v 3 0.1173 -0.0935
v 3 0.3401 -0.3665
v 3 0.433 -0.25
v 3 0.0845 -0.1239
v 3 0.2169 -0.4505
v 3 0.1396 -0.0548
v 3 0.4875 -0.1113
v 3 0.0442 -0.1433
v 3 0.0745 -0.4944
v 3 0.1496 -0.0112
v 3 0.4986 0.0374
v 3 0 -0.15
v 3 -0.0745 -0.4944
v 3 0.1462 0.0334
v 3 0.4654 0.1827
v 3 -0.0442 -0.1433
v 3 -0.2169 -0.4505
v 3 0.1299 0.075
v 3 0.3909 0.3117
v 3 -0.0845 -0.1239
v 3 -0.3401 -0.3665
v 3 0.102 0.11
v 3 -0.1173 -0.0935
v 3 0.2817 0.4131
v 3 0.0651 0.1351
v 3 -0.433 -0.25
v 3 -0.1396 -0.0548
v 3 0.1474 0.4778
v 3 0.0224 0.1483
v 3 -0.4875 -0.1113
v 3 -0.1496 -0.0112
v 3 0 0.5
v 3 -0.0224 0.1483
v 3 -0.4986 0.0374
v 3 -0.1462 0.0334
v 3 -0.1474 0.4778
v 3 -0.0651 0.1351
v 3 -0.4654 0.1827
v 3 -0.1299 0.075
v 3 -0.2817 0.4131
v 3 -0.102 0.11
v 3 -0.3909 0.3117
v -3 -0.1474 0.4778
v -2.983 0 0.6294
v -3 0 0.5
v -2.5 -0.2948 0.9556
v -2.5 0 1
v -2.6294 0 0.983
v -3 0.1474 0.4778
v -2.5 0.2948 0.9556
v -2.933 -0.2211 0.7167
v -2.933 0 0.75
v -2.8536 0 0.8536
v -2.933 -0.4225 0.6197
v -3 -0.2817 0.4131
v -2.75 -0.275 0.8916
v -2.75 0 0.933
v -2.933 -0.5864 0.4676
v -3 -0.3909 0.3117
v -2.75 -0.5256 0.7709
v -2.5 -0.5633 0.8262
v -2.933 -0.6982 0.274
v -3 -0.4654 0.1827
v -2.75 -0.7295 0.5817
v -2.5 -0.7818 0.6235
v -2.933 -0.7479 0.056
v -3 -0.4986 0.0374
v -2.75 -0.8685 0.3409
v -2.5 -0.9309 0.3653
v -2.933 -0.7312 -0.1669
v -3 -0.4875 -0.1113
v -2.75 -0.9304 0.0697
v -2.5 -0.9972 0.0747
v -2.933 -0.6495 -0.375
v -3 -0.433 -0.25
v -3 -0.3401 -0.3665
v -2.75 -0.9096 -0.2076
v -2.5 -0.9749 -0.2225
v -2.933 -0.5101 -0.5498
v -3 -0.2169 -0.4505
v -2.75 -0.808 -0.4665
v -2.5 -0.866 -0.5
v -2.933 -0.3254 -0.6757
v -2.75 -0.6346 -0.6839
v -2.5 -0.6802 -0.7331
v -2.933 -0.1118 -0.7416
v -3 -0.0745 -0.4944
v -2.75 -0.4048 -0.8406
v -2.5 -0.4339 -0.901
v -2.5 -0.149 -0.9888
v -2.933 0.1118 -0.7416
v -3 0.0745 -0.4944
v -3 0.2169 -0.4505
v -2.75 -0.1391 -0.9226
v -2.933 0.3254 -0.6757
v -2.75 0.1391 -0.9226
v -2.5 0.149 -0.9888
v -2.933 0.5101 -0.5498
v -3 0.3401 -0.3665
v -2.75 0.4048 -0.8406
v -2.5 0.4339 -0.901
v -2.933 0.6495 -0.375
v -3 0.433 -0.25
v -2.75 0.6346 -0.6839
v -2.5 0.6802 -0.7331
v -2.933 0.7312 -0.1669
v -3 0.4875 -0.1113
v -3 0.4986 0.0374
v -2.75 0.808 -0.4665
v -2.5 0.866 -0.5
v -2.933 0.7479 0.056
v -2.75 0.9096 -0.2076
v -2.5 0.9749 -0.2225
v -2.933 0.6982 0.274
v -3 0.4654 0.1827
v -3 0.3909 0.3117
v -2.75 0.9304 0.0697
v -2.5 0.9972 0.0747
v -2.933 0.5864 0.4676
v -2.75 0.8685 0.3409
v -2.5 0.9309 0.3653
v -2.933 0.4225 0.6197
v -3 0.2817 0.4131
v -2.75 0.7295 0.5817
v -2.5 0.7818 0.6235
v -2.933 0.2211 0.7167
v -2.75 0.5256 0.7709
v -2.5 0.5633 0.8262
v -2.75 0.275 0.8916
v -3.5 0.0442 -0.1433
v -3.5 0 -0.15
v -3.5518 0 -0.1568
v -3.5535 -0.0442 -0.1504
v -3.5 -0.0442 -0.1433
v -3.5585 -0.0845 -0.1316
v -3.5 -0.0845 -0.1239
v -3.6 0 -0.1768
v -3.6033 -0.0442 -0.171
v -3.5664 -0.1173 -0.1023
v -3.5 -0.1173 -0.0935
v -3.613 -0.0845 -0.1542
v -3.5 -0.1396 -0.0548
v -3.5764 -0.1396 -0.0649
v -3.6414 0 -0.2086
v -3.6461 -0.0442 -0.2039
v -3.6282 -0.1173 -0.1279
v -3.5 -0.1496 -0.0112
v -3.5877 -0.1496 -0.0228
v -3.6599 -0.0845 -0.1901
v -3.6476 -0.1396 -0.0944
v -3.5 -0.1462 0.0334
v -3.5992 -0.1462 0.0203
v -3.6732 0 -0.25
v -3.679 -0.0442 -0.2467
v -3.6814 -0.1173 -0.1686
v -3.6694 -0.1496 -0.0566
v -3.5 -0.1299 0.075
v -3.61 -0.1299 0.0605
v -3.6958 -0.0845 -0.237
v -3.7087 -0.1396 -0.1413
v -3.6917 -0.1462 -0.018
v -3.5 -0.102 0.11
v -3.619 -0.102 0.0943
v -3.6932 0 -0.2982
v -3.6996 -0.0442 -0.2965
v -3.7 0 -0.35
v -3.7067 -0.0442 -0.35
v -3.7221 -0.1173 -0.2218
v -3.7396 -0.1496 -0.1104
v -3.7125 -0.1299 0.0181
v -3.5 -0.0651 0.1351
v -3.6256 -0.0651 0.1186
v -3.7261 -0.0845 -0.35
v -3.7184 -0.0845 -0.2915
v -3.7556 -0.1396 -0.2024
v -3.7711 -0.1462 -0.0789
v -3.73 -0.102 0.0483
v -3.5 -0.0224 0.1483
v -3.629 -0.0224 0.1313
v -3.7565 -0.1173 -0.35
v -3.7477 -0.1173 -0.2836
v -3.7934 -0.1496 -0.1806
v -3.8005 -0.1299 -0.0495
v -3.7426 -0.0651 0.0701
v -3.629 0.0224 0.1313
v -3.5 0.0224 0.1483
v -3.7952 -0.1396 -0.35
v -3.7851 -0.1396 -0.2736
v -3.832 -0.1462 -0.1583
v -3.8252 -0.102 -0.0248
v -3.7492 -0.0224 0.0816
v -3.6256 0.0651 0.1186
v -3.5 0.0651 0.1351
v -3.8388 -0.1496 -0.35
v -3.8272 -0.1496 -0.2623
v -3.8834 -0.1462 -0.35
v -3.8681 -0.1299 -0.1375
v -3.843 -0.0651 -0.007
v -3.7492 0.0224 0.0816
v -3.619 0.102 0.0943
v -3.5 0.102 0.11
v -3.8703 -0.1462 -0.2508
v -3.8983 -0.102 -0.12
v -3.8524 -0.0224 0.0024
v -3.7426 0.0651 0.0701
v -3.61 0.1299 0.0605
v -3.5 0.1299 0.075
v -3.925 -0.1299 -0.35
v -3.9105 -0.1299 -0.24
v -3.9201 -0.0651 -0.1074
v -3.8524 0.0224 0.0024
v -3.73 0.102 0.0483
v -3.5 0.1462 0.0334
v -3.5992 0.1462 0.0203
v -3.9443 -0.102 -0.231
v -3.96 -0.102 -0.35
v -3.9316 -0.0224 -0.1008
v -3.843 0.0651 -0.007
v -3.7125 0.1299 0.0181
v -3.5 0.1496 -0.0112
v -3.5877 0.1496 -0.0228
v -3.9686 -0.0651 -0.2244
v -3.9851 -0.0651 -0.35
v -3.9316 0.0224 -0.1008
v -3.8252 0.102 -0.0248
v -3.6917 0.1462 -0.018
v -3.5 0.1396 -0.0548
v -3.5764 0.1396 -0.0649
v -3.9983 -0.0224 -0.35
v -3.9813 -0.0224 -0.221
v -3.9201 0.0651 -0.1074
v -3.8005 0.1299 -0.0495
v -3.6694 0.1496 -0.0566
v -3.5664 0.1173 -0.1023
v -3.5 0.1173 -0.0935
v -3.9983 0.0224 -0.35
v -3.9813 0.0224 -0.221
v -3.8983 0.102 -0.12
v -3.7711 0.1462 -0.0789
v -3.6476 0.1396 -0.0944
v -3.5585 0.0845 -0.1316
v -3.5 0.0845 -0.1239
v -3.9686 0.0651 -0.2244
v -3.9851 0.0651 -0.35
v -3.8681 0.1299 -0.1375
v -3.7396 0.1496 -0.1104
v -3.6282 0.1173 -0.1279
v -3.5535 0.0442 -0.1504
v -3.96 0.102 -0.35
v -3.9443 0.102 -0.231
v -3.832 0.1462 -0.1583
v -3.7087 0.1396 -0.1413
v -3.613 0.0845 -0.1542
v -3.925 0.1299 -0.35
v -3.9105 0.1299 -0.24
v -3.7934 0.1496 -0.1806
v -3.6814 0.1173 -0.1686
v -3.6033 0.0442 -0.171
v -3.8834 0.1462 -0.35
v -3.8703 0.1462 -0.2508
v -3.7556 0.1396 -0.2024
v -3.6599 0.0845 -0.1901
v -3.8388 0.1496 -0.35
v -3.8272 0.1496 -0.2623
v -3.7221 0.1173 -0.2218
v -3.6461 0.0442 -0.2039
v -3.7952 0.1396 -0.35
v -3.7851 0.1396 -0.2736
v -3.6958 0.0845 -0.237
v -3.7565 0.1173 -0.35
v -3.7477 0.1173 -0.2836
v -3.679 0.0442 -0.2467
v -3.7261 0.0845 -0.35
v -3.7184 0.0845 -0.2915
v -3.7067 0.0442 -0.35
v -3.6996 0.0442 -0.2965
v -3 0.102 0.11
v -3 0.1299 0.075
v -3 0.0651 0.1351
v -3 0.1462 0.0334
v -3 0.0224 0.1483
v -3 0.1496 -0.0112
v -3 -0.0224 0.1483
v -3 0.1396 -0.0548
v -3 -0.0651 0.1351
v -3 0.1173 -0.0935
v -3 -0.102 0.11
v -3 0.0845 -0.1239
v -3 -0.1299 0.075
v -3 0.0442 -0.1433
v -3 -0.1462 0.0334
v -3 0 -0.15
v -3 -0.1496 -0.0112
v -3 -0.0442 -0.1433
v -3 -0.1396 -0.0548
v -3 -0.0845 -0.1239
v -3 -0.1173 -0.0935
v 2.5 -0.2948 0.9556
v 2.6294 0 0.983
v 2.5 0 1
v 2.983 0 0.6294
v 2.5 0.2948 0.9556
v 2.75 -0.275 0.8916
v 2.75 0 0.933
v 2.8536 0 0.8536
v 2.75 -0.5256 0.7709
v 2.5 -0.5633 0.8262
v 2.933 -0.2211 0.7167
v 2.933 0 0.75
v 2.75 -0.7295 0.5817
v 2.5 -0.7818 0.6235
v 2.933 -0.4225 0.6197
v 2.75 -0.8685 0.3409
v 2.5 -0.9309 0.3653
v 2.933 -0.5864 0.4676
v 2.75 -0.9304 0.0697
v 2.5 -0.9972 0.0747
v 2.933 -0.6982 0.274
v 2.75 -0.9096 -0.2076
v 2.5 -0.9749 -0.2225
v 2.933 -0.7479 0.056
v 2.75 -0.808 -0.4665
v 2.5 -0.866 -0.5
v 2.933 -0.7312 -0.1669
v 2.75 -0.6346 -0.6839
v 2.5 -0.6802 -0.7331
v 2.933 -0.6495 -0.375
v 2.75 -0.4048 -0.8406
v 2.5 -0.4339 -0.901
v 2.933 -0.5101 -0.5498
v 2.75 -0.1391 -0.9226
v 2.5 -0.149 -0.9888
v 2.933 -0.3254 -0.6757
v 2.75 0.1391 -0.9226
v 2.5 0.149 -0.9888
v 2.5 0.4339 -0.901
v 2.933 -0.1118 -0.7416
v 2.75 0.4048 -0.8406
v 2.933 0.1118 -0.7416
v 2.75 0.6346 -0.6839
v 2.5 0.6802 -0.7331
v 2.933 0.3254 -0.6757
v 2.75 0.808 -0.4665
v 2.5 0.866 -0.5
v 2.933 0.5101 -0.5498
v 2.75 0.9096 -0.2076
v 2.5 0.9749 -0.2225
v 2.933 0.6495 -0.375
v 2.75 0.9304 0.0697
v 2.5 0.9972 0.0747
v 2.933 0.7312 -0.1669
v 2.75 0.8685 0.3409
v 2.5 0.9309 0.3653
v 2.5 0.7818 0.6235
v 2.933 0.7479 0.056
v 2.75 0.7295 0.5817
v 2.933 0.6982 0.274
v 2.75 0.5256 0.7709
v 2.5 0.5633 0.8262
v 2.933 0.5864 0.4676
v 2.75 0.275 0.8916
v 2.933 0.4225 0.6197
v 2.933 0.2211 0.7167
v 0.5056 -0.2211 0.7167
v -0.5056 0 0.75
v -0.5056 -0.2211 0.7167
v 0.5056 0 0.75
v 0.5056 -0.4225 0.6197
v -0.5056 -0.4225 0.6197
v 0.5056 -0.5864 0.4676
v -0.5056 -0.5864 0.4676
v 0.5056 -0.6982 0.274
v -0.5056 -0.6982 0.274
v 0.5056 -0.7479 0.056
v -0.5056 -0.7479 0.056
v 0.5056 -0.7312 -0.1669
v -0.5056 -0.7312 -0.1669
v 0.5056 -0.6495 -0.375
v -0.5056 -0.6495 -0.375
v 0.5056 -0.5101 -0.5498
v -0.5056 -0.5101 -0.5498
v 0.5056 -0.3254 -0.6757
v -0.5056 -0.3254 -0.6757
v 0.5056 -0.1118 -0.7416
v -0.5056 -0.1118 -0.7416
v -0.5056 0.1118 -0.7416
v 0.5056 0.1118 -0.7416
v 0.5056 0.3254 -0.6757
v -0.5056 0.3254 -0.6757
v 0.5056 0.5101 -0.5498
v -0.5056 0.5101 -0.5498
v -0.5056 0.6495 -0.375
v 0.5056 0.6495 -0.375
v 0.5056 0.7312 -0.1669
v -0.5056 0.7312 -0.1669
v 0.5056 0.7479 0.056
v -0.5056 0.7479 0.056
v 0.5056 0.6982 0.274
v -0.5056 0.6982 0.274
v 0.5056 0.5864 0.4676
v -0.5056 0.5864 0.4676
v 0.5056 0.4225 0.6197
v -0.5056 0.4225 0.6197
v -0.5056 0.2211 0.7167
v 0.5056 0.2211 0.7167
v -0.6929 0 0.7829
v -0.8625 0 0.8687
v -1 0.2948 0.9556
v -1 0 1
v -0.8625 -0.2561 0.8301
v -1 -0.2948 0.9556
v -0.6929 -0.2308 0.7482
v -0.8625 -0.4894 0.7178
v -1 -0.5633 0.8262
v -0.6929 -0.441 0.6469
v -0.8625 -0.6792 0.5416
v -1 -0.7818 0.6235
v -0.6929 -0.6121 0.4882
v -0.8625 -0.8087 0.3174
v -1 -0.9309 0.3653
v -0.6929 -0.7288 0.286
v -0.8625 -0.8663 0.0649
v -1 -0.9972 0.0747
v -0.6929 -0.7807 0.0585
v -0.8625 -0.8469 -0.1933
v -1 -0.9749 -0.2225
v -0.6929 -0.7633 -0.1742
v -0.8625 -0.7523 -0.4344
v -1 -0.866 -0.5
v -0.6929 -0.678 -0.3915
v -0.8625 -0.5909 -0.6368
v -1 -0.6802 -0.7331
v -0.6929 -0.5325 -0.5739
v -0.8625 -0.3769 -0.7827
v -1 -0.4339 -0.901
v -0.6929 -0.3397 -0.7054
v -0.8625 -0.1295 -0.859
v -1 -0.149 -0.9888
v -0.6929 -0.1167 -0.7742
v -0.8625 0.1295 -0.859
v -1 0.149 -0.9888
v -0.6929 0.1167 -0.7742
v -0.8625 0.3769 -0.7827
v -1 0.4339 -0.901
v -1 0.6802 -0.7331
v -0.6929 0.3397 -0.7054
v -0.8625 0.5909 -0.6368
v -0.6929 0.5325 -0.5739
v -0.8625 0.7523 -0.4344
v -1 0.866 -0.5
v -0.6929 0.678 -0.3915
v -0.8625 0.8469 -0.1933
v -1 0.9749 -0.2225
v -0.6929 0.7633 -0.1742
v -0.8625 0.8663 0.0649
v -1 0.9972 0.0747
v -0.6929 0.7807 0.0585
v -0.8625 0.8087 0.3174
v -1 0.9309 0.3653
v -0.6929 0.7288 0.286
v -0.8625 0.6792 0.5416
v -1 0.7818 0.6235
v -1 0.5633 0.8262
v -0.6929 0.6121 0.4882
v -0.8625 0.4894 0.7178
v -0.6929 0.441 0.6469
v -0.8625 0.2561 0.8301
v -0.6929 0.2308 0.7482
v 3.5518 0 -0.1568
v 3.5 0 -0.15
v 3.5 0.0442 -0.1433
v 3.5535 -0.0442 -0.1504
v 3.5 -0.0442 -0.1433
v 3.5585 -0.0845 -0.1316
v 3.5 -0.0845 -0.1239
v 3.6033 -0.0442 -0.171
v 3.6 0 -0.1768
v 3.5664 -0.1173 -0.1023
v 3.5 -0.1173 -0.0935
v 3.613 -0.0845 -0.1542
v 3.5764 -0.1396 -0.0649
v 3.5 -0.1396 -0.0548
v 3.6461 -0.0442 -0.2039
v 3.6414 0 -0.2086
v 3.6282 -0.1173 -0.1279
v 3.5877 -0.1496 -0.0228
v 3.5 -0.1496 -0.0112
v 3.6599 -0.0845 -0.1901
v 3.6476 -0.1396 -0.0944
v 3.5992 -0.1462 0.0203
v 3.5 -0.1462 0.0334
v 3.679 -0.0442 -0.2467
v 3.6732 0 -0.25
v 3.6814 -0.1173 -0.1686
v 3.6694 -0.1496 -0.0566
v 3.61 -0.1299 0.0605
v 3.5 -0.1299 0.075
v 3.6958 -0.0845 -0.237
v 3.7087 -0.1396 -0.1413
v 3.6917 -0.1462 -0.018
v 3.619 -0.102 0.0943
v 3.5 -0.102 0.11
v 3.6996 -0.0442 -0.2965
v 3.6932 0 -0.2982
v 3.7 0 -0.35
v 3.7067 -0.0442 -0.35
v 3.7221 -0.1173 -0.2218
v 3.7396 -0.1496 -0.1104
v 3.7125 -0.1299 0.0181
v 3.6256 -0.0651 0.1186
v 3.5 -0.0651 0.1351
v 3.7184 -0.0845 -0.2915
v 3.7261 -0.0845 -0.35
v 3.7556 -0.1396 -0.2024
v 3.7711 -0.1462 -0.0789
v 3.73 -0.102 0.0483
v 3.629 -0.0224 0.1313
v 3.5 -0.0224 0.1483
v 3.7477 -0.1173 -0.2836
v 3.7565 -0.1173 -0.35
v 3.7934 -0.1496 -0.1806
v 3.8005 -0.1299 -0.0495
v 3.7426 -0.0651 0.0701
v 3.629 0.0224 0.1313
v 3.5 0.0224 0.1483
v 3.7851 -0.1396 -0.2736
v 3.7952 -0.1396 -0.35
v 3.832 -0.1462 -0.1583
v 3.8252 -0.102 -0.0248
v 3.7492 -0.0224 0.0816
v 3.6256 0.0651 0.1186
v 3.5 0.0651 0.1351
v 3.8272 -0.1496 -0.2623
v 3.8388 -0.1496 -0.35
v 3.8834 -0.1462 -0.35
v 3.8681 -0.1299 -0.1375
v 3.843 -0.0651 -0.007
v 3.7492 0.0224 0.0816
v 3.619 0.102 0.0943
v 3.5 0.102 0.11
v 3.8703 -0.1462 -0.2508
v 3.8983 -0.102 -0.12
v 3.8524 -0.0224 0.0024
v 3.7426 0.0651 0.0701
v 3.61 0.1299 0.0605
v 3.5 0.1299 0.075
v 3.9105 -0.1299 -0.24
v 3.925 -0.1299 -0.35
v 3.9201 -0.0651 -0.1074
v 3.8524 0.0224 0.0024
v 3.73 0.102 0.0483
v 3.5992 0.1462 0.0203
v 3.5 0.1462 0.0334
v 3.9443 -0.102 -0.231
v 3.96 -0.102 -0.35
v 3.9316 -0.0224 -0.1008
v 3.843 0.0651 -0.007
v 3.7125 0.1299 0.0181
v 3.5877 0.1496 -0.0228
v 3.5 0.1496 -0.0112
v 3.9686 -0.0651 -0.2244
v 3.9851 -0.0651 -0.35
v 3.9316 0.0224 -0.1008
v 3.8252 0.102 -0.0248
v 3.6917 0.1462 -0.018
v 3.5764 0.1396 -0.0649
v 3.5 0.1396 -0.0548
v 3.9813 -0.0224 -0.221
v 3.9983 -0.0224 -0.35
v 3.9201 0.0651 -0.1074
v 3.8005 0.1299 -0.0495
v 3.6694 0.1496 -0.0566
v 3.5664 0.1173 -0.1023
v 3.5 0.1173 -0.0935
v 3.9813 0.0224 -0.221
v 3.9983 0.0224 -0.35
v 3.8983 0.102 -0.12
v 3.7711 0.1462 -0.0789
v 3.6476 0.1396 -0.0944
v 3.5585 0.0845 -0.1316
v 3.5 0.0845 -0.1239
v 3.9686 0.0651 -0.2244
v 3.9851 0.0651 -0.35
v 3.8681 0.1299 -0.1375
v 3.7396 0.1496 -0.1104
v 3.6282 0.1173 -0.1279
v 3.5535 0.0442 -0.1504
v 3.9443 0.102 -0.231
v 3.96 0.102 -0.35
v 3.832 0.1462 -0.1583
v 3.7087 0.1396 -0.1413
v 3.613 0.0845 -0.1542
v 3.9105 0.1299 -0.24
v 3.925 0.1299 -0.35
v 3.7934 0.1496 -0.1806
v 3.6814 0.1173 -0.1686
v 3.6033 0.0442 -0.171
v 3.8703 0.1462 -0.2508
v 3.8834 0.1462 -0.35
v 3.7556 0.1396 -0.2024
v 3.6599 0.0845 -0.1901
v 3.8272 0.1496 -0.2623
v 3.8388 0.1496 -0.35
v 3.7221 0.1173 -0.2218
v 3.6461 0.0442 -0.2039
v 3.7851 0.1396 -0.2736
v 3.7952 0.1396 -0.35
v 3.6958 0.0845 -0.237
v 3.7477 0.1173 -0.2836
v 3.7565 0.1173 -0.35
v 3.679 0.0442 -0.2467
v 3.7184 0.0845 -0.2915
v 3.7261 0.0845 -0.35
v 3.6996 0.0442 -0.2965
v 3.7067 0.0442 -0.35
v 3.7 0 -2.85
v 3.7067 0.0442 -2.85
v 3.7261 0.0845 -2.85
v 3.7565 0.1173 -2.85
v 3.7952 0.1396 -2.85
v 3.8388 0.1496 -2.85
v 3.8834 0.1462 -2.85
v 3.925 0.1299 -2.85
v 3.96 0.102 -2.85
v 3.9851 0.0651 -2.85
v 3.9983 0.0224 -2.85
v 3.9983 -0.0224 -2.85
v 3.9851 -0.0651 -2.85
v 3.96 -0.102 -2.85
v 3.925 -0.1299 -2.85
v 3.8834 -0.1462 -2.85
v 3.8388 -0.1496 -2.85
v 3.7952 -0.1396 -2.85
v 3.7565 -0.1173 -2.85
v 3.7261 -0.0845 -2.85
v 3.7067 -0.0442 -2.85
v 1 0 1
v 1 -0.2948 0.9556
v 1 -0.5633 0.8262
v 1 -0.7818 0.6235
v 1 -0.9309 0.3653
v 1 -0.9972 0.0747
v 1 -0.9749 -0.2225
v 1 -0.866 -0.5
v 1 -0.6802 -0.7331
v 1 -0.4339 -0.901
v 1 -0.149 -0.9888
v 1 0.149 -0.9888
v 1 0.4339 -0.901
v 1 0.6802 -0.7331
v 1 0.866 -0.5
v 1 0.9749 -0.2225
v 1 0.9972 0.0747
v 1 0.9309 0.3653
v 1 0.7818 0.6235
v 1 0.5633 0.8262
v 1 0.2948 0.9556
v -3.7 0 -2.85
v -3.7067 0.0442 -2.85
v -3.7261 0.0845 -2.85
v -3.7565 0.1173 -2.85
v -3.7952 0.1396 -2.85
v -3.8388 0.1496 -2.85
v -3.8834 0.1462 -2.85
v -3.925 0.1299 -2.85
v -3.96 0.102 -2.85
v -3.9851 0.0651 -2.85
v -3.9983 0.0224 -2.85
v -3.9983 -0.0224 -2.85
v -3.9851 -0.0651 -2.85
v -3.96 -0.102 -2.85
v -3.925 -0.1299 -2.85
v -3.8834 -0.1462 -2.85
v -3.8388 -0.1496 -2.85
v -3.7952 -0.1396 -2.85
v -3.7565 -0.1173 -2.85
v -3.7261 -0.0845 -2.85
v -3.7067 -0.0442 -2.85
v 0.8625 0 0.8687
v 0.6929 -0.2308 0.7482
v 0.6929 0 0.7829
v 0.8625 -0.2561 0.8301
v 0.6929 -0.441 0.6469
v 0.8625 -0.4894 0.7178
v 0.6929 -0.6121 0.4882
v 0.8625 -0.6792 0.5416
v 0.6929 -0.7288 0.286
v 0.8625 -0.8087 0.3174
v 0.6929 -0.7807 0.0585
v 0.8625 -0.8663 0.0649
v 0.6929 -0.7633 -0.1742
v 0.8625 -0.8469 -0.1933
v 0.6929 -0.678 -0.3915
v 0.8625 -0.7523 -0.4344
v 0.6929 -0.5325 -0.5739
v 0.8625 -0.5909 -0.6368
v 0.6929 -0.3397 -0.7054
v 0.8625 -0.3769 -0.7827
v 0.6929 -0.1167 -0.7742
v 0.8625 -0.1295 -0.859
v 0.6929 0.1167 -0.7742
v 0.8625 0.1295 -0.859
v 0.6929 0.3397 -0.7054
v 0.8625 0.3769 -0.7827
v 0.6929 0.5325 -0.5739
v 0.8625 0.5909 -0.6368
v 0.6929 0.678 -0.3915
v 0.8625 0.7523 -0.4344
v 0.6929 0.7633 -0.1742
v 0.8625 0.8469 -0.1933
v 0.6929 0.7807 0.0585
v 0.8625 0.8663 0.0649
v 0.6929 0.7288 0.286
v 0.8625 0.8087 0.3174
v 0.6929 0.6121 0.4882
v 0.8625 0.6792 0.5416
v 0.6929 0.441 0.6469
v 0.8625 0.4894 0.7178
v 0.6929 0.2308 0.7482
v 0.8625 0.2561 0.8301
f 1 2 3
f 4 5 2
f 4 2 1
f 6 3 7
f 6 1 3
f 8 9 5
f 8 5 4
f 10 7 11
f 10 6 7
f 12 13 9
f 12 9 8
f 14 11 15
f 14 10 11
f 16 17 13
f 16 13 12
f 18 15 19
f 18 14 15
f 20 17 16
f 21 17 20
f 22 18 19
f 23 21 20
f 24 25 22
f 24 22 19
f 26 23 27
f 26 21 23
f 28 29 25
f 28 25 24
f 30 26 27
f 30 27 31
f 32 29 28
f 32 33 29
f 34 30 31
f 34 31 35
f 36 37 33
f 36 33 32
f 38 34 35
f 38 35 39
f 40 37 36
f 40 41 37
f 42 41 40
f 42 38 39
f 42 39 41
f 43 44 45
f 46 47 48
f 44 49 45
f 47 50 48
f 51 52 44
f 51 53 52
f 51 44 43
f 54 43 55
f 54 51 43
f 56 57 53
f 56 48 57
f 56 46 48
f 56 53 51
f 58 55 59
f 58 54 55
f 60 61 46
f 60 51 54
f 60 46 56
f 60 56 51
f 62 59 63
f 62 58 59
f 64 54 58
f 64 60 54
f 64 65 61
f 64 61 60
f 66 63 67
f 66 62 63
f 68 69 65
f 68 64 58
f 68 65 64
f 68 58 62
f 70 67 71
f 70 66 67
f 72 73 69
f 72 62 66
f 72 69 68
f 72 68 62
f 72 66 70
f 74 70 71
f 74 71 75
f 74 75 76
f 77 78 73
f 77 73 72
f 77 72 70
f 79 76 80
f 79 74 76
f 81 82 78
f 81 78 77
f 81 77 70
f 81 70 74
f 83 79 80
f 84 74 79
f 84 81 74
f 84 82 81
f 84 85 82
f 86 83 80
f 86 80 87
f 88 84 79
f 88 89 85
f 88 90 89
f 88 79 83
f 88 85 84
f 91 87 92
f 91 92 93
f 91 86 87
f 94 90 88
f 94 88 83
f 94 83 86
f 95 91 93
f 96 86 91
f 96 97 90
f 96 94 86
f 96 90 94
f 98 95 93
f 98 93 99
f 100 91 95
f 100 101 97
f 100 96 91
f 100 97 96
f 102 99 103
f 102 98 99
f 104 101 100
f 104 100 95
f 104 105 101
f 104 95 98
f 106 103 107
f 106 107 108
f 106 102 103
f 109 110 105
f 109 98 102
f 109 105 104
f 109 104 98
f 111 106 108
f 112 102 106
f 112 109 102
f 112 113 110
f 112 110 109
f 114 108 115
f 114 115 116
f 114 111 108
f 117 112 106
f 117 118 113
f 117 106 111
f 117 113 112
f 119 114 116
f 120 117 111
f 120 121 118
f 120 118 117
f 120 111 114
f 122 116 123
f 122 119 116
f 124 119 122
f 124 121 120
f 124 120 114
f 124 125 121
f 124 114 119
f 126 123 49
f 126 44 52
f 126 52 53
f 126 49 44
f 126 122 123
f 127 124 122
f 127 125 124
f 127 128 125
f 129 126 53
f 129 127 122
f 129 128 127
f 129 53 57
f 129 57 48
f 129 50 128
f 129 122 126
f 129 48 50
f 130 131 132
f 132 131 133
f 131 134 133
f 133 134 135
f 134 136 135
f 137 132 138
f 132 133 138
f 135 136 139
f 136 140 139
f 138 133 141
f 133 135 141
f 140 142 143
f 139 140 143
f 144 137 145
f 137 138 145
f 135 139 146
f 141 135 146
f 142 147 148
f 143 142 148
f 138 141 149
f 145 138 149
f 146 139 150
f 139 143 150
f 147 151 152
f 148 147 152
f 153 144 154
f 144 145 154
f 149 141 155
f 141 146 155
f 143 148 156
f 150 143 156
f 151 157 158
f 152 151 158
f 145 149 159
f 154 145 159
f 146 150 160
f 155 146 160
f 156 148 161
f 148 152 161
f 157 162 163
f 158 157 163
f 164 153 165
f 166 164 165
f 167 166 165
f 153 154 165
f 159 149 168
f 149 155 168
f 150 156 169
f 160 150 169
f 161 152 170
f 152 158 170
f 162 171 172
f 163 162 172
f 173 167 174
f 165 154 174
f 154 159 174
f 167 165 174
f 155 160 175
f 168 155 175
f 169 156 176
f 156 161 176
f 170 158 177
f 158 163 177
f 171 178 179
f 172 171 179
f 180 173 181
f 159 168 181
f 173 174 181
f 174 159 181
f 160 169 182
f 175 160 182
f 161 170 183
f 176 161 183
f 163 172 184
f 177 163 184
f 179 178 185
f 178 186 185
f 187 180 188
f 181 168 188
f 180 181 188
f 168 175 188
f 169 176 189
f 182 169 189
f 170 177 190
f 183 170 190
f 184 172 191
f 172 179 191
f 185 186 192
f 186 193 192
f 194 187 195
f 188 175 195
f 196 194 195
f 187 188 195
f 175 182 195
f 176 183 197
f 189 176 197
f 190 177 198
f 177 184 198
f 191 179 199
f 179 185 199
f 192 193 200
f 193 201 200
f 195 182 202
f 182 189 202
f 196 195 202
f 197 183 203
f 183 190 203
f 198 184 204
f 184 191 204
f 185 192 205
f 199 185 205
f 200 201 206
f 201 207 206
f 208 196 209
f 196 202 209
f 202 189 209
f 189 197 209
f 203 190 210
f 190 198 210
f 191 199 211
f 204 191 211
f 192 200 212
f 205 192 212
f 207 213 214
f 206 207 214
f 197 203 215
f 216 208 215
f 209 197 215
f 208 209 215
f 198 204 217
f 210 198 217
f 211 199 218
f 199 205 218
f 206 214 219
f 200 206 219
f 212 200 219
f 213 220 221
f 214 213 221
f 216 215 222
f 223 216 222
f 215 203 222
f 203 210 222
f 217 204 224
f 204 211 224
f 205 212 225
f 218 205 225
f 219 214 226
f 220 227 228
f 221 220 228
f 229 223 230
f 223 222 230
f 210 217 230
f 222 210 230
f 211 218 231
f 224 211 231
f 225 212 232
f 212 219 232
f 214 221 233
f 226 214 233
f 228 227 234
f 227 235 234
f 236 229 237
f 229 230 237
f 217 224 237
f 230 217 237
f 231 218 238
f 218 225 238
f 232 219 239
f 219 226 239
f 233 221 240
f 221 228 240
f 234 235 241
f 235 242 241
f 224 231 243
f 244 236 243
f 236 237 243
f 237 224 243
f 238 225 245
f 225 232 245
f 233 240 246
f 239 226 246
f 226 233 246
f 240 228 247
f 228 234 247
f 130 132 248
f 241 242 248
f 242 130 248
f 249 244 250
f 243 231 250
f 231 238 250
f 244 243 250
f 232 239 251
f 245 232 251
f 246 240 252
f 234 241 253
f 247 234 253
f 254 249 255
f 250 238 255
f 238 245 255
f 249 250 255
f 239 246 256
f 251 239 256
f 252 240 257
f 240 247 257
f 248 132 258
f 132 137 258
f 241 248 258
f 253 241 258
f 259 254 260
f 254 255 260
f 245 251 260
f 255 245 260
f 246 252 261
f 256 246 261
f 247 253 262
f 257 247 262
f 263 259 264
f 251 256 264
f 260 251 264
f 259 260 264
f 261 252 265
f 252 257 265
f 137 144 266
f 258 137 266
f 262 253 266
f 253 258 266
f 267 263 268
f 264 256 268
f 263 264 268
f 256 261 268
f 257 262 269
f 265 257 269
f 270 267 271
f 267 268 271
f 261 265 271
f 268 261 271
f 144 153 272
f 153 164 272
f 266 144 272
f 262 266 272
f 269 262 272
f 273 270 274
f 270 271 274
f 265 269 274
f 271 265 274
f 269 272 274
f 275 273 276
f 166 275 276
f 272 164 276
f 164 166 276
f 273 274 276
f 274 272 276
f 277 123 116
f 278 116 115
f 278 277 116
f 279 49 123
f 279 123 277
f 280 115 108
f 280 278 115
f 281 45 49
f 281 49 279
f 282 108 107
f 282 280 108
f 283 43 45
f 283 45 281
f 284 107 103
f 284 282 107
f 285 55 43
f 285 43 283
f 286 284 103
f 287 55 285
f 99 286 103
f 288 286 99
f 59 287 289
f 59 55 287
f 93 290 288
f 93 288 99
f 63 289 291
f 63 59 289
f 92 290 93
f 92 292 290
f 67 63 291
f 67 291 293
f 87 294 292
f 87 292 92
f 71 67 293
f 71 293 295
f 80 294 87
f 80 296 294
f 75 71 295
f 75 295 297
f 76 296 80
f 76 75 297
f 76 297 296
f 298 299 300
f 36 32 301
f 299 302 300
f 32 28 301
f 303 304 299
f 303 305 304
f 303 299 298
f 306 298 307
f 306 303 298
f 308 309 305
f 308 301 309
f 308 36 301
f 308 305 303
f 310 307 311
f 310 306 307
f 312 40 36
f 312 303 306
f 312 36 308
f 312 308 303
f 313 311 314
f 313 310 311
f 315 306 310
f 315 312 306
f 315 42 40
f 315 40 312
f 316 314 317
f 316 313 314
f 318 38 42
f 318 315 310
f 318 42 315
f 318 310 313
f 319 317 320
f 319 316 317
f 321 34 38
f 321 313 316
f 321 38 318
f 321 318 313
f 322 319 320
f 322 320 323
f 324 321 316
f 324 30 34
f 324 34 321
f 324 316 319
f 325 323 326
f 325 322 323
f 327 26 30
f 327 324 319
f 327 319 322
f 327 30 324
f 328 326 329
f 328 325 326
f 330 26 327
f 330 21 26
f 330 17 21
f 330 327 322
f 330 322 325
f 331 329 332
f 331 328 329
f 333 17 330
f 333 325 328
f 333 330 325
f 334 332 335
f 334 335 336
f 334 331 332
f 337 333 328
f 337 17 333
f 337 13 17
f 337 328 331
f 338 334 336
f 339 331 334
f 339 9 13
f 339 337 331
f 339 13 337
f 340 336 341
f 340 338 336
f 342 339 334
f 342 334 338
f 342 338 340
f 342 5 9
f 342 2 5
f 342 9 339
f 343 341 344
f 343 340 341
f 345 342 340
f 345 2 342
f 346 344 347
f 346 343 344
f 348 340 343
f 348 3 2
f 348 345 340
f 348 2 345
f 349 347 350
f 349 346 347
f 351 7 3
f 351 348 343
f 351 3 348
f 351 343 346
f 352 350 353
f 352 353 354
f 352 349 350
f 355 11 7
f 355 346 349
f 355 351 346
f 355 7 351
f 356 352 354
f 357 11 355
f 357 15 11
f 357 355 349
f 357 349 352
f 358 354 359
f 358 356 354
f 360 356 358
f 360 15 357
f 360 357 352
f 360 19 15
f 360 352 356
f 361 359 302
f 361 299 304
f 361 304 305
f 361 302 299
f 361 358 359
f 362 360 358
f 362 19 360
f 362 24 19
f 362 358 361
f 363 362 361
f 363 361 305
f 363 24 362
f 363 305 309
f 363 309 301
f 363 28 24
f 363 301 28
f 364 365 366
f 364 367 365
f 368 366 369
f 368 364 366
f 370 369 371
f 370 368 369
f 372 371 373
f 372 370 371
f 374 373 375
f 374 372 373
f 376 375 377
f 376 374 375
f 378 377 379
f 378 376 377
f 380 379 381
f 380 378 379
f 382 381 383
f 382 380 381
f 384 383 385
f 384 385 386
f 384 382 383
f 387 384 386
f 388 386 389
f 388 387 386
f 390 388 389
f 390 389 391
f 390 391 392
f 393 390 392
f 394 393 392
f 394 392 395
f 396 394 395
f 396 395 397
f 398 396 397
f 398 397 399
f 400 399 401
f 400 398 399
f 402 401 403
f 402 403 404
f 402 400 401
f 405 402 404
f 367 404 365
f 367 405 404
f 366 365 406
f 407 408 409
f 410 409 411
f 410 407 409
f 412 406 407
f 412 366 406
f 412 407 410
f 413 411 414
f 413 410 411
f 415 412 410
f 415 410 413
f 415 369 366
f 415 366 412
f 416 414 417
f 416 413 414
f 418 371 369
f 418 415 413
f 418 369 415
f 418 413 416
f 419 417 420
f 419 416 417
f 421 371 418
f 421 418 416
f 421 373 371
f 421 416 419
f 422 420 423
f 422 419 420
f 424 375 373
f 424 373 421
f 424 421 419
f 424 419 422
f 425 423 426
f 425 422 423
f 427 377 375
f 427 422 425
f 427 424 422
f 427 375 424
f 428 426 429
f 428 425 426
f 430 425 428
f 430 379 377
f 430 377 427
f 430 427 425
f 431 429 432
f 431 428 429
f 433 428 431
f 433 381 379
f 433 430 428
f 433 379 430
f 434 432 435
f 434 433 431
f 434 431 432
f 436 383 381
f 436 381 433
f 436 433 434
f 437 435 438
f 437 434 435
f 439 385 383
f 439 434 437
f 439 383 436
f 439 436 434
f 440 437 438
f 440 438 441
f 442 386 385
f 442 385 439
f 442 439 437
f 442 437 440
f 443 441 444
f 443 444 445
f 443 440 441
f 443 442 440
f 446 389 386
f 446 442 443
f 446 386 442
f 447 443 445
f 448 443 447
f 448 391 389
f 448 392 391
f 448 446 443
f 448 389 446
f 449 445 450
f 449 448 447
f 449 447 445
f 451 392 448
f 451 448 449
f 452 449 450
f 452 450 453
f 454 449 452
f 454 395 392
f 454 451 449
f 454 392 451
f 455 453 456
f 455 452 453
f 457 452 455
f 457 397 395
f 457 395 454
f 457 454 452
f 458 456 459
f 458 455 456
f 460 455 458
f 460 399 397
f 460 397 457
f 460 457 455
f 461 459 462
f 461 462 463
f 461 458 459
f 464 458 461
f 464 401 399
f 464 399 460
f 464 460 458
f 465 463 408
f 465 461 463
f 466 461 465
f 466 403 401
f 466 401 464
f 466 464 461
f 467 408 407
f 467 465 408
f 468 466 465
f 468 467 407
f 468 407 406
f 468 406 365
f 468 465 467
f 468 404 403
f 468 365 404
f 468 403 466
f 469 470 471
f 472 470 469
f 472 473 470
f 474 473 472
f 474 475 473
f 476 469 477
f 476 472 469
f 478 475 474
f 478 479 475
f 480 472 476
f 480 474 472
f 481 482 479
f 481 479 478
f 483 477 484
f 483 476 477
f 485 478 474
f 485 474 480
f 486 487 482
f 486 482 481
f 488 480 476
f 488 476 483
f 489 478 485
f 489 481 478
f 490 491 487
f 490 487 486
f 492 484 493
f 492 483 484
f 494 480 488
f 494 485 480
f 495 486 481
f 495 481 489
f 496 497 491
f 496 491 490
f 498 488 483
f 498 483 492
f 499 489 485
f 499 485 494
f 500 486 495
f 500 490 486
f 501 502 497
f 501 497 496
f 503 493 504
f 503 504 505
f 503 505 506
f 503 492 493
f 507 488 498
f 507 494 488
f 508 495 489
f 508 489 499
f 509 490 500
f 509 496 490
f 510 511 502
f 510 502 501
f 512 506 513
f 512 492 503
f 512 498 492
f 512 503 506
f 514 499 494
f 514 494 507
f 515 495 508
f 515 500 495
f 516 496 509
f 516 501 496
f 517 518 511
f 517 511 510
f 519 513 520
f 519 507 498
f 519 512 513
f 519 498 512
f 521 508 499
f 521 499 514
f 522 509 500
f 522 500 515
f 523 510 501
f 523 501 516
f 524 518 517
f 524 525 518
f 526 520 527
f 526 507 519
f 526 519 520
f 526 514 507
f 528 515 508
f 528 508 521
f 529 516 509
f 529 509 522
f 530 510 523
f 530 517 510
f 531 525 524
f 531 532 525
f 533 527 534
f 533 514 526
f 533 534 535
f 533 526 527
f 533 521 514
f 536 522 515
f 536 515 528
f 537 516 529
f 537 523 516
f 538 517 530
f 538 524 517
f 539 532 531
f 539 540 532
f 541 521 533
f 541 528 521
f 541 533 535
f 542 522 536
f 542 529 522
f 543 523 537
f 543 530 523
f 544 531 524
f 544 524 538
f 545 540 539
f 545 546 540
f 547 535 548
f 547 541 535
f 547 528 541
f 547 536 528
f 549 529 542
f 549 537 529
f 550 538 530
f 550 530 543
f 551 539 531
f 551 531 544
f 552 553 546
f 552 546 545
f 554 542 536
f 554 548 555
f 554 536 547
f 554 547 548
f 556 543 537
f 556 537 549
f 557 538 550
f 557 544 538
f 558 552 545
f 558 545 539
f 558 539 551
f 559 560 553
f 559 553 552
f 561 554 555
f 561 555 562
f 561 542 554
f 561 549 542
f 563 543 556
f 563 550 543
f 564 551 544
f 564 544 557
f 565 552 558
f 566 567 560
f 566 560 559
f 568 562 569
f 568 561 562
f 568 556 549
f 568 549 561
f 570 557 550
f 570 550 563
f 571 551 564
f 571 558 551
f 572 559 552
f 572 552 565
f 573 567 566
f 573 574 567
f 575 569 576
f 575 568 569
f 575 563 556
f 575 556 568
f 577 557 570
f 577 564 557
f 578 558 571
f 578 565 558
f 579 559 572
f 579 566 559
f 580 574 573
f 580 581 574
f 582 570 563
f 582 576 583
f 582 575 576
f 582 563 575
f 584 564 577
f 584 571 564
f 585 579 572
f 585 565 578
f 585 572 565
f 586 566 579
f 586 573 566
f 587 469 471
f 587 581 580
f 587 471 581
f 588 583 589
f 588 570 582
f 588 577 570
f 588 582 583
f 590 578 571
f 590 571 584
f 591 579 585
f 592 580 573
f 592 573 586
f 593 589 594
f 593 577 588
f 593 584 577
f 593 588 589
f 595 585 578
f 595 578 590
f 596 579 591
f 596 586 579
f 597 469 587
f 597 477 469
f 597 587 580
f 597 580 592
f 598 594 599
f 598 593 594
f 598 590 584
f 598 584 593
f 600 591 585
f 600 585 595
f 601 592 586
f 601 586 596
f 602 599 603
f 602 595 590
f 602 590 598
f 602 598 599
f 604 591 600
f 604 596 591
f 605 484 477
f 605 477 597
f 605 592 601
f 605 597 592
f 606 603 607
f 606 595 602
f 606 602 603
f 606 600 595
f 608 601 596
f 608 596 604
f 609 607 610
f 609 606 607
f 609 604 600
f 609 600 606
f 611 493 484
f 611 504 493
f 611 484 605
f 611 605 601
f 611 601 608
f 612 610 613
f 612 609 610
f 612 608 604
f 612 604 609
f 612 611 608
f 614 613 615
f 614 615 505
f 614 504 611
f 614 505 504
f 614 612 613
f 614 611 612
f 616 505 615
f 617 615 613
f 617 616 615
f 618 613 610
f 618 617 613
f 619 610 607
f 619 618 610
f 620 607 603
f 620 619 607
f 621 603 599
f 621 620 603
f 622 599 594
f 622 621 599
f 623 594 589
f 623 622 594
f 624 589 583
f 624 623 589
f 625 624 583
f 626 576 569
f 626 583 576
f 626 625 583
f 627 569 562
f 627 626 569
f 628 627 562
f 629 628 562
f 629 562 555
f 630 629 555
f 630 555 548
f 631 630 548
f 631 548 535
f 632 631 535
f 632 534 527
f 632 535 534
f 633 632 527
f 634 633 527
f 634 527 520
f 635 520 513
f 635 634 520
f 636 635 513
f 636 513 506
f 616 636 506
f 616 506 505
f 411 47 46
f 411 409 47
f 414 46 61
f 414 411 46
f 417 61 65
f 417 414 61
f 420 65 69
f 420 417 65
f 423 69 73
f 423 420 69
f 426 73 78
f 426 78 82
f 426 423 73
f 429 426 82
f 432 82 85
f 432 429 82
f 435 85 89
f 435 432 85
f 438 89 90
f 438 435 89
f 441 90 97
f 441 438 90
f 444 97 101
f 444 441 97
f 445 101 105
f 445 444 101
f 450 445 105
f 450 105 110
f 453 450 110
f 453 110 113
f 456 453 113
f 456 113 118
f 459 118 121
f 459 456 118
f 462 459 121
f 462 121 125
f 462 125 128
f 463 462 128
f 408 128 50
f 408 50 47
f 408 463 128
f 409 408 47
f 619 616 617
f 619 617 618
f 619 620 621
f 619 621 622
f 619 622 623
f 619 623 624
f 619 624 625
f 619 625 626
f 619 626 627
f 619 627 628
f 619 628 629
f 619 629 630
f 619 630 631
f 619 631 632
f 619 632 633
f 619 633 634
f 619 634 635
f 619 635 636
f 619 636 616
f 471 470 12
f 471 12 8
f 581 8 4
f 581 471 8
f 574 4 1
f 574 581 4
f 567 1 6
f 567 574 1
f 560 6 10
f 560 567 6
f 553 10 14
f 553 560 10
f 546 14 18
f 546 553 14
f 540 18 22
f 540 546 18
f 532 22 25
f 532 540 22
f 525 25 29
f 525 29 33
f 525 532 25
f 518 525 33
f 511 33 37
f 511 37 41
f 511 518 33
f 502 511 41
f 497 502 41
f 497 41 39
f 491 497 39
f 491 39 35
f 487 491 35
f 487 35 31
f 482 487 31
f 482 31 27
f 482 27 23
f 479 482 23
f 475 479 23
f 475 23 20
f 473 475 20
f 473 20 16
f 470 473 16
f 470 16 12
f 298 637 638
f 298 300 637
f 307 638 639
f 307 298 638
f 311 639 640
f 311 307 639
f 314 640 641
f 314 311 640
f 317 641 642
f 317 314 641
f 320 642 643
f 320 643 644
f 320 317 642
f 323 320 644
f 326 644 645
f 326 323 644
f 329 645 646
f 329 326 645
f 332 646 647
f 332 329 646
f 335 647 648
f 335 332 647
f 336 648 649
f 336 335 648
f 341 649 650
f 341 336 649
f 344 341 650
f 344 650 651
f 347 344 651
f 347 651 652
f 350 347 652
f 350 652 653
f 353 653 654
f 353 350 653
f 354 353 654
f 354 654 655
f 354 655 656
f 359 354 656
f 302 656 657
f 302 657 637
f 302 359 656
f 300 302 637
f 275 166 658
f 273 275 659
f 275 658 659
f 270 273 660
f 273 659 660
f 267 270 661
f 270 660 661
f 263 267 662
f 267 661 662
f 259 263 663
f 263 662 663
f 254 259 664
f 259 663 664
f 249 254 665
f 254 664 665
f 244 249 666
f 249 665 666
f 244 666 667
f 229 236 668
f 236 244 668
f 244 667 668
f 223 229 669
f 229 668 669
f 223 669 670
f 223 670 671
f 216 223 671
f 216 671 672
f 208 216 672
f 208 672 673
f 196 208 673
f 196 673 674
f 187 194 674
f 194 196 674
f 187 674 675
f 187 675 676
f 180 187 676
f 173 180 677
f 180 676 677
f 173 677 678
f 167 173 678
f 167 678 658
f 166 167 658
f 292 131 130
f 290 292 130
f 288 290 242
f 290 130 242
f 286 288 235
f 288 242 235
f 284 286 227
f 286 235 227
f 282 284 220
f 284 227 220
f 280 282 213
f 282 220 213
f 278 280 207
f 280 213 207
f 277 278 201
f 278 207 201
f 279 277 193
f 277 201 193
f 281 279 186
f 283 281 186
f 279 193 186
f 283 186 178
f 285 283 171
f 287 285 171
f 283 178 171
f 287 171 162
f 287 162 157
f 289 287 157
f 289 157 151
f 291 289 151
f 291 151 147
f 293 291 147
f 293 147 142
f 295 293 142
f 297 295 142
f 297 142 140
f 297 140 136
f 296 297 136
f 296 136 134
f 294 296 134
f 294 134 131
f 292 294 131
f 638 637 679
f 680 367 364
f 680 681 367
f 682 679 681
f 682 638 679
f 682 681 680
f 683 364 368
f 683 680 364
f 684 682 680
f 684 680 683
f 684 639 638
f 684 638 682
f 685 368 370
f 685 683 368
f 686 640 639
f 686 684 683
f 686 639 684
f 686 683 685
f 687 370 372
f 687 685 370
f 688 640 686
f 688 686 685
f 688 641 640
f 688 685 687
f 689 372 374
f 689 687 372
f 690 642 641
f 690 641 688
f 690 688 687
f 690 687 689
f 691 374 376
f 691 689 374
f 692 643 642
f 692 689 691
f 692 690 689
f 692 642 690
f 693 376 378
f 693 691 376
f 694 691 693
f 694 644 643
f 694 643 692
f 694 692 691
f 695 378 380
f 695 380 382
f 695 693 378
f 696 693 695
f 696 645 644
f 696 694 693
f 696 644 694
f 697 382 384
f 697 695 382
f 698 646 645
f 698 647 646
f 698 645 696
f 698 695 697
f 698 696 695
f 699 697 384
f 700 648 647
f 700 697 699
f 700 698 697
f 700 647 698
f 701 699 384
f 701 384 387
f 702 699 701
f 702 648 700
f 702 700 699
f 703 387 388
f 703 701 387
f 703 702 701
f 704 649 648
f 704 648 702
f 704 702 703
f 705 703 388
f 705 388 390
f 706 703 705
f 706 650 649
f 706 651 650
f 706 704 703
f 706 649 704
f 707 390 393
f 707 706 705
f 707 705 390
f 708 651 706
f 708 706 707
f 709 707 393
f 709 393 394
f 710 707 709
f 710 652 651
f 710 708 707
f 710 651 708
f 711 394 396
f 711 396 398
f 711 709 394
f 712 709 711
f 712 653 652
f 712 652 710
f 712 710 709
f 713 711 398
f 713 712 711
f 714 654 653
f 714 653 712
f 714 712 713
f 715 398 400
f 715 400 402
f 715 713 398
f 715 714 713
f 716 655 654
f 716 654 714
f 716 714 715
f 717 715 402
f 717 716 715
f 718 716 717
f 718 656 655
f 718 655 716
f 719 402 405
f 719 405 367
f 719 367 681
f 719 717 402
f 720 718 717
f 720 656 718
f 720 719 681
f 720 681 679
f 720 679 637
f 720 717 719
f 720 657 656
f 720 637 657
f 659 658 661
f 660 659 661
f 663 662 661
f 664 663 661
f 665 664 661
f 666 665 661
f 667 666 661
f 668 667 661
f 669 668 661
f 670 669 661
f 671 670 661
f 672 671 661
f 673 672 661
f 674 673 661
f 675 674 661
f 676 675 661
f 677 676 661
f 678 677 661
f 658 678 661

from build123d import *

# Parameters (mm, degrees)
SKETCH_2_R = 0.15


with BuildPart() as part:
    # 草图1 → 旋转1 (revolve)
    with BuildSketch(Plane.XY, mode=Mode.PRIVATE) as revolve_1_sk:
        with BuildLine():
            Line((3, 0.5), (3, 0))
            Line((3, 0), (-3, 0))
            Line((-3, 0), (-3, 0.5))
            ThreePointArc((-3, 0.5), (-2.853553391, 0.853553391), (-2.5, 1))
            Line((-2.5, 1), (-1, 1))
            ThreePointArc((-1, 1), (-0.780842208, 0.819581425), (-0.505634241, 0.75))
            Line((-0.505634241, 0.75), (0.505634241, 0.75))
            ThreePointArc((0.505634241, 0.75), (0.780842208, 0.819581425), (1, 1))
            Line((1, 1), (2.5, 1))
            ThreePointArc((2.5, 1), (2.853553391, 0.853553391), (3, 0.5))
        make_face()
    revolve(revolve_1_sk.sketch.rotate(Axis((-1000, 0, 0), (1, 0, 0)), 90), axis=Axis((-1000, 0, 0), (1, 0, 0)))

    # 扫描1: sweep along a path in 草图3
    with BuildLine(Plane(origin=(0, 0, 0), x_dir=(1, 0, 0), z_dir=(0, 1, 0))) as sweep_1_path:
        Line((3, -0.15), (3.5, -0.15))
        ThreePointArc((3.5, -0.15), (3.853553391, -0.003553391), (4, 0.35))
        Line((4, 0.35), (4, 2.85))
    # 草图2 → 扫描1 (sweep)
    with BuildSketch(Plane(origin=(3, 0, 0), x_dir=(0, 0, -1), z_dir=(1, 0, 0))):
        Circle(SKETCH_2_R)
    sweep_1 = sweep(path=sweep_1_path.line)

    # 镜向1: 扫描1 across plane
    add(sweep_1.mirror(Plane(origin=(0, 0, 0), x_dir=(0, 0, 1), z_dir=(1, 0, 0))))


solid = part.part
